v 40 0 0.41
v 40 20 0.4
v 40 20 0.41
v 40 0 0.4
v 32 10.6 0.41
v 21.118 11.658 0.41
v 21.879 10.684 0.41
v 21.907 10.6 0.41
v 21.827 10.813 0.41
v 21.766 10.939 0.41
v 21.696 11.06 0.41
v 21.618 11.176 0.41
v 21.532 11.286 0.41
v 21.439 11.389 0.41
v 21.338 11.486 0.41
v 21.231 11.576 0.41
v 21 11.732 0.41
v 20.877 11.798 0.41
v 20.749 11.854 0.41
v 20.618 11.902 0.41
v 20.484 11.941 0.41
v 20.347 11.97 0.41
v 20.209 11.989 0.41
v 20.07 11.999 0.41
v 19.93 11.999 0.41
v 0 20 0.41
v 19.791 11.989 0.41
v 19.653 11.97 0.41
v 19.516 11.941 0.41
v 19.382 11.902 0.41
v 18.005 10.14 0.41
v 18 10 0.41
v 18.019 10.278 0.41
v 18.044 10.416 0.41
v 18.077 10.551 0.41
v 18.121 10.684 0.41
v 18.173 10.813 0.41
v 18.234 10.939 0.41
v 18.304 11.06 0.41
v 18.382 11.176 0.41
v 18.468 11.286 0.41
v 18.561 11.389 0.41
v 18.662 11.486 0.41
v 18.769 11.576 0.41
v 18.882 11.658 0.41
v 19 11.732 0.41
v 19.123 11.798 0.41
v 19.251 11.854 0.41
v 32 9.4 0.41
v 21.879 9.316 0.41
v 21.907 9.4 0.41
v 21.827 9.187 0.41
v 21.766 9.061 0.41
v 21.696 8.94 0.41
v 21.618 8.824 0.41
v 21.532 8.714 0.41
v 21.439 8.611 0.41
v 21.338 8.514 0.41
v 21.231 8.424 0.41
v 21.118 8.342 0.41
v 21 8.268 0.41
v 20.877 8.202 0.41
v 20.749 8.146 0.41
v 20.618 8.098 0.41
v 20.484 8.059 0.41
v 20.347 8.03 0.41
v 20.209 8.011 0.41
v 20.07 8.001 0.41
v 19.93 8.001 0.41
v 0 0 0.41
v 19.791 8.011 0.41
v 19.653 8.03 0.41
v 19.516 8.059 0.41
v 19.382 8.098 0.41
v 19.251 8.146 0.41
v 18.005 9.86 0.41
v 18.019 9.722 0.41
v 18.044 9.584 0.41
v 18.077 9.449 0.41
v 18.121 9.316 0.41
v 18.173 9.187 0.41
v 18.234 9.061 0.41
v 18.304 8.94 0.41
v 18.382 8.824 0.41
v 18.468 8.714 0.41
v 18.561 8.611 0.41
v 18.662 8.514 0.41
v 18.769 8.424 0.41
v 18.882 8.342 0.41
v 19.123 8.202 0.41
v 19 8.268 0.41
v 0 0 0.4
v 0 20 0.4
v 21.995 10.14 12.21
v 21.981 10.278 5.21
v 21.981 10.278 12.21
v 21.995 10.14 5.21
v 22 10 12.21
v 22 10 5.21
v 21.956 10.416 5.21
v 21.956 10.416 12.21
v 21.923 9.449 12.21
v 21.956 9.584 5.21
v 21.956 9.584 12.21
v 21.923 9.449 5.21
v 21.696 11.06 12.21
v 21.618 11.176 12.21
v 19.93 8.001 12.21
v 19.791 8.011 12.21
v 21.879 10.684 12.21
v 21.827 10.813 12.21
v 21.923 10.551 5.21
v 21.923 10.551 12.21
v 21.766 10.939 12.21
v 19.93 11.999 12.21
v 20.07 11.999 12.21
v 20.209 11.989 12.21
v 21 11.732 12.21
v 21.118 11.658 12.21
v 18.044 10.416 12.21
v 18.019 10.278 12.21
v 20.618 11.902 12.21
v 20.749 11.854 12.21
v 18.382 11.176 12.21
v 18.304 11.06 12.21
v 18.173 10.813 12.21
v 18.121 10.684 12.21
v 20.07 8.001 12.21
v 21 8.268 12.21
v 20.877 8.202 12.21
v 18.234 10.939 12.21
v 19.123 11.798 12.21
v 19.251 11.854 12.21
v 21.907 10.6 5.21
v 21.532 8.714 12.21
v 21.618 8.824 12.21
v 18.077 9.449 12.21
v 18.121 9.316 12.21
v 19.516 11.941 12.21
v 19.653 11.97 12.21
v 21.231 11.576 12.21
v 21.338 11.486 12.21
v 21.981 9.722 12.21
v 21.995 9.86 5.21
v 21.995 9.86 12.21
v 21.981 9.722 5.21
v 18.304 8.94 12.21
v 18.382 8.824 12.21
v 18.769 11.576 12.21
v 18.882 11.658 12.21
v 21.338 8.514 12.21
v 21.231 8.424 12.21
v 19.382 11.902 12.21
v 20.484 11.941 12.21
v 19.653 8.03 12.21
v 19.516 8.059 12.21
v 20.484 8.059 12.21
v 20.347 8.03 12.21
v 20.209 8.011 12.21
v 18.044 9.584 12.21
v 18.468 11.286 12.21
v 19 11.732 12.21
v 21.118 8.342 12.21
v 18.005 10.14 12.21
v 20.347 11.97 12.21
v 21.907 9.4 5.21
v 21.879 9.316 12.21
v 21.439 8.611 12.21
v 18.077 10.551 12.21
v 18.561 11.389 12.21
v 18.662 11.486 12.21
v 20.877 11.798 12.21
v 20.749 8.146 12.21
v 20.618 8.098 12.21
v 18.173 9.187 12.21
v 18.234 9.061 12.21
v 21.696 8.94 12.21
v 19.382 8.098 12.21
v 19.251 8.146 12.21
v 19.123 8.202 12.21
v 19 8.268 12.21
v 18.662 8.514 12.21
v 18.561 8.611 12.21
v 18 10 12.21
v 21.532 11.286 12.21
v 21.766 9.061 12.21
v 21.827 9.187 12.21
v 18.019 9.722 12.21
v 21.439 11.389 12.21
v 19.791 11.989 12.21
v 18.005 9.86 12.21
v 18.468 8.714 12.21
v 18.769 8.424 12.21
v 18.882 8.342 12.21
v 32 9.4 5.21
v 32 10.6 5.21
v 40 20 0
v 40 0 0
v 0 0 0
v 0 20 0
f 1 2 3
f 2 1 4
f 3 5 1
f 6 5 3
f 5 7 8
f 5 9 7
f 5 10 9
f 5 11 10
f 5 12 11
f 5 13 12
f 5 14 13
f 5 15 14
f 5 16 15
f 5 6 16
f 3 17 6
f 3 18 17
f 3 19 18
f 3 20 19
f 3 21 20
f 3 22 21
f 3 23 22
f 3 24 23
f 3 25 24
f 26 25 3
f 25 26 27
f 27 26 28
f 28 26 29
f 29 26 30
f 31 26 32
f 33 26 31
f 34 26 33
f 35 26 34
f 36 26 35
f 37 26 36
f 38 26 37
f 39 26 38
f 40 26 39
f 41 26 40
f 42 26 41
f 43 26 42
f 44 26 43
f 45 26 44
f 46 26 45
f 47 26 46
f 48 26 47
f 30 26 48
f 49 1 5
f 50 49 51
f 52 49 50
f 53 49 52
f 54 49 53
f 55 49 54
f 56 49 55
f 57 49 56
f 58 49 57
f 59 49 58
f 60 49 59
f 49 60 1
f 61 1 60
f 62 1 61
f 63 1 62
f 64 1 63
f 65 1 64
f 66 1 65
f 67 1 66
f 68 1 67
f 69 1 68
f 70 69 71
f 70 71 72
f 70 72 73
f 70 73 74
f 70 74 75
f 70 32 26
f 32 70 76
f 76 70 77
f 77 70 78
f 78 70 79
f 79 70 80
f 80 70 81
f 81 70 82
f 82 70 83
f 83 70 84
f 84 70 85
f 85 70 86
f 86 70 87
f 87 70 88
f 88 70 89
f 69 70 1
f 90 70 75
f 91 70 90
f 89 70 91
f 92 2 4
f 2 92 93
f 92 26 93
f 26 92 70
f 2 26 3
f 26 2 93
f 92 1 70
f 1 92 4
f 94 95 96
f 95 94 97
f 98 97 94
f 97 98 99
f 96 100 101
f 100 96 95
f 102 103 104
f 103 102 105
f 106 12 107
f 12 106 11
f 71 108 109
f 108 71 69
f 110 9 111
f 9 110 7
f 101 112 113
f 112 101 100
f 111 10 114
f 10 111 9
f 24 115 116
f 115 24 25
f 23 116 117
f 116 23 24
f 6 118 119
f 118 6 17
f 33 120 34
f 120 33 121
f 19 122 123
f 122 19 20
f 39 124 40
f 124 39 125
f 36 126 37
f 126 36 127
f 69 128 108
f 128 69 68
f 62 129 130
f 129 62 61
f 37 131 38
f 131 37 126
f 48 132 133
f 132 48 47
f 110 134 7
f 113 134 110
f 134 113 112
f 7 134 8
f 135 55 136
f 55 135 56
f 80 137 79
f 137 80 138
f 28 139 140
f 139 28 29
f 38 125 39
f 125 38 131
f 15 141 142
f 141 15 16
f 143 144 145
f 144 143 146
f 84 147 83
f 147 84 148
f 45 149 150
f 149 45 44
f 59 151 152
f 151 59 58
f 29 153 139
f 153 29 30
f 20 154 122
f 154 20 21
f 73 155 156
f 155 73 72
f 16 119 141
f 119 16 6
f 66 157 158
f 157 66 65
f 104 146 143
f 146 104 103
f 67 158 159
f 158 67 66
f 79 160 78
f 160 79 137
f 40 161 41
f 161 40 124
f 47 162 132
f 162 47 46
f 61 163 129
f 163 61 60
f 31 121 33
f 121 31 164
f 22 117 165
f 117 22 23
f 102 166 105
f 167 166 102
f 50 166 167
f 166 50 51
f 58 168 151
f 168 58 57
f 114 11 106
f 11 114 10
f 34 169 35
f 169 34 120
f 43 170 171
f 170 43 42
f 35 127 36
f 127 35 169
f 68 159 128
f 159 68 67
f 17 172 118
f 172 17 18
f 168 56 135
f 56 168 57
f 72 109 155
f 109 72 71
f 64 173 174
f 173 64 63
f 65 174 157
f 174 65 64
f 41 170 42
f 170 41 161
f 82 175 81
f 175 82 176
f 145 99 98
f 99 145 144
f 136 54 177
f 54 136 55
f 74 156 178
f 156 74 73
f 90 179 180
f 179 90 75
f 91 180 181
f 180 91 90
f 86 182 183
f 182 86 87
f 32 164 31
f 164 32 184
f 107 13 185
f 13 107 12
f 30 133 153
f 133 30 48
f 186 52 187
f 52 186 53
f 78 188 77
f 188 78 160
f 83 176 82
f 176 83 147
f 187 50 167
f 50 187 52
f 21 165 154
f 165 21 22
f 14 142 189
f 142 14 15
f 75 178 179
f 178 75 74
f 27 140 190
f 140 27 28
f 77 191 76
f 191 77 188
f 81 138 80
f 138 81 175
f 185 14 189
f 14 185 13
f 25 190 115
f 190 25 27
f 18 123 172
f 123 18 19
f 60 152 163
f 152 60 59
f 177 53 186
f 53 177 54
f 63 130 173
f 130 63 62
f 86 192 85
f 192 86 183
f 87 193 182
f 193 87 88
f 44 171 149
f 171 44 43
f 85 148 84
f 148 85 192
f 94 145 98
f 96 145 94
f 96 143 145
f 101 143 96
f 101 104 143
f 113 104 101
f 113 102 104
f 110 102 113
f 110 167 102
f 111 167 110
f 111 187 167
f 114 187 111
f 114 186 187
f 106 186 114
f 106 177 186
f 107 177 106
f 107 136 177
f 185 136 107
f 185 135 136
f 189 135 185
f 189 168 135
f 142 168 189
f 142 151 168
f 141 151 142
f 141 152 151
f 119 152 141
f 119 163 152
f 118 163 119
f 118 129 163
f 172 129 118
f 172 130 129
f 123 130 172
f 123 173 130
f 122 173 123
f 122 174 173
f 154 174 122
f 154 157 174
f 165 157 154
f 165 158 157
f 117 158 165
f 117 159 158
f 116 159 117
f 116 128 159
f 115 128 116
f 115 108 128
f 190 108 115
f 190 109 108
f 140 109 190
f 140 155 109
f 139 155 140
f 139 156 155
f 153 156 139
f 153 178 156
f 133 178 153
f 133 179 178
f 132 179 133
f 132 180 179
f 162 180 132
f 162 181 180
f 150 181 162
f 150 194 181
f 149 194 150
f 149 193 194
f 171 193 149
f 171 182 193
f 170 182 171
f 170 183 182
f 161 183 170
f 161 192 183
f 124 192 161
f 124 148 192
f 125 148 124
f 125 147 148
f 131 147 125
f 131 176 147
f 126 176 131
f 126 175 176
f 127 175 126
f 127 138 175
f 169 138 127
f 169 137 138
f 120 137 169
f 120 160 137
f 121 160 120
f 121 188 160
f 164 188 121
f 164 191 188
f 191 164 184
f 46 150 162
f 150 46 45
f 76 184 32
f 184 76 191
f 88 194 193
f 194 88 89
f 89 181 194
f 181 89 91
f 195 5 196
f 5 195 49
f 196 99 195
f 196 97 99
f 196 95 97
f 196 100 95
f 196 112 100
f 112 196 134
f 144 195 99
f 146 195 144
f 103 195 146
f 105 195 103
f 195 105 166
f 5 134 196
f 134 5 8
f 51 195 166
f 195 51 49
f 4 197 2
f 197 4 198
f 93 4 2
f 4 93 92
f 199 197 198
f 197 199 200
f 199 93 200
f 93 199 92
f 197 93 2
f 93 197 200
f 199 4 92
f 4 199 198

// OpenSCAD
// file: ../../Base/PlacementOptions.scad
// Fischertechnik Box Foundation
// Placement Options

// Alignment
NoAlign = 0;
AlignLeft = 1;
AlignBottom = 2;
AlignCenter = 3;
AlignRight = 4;
AlignTop = 5;

// Element rotation degree steps
rotations = [0, -90, -180, -270];

// Rotation
NoRotation = 0;
Rotate0 = 0;
Rotate90 = 1;
Rotate180 = 2;
Rotate270 = 3;

// Docking (seen from above)
NoDock = -1;
DockLeft = 0;
DockTop = 1;
DockRight = 2;
DockCorner = 2;
DockBottom = 3;

// Web corners
LowerLeft = 0;
UpperLeft = 1;
UpperRight = 2;
LowerRight = 3;

// Web position relative to corner
LeftOfCorner = 0;
RightOfCorner = 1;
// file: ../../Base/Boxes.scad
// Fischertechnik Box Foundation
// Pre-designed Boxes

use <Constants.scad>

include <PlacementOptions.scad>

box190Width = 190;
box190Depth = 130;
box130Width = 130;
box130Depth = 95;
boxUsageHeight = 33.9;
boxWallThickness = 2.4;
boxBaseThickness = 1.0;
boxWebWidth = 3.0;

// getBoxWallThickness()
// Gets the wall thickness of a Fischertechnik Box

function getBoxWallThickness() = boxWallThickness;

// Gets the usable height of a fischertechnik box
function getBoxUsageHeight() = boxUsageHeight;

// Gets the thickness of the Fischertechnik box base.
function getBoxBaseThickness() = boxBaseThickness;

// Gets the width of a box web
function getBoxWebWidth() = boxWebWidth;

// Gets the usable inner space of a Box 190 as an x/y-list
function getBox190Space() = [
    box190Width - 2*getBoxWallThickness(), 
    box190Depth - 2*getBoxWallThickness() ];

// Imports the Fischertechnik empty box 130x190 mm and places it at position 0,0
// 190x130 are the outer sizes, the inner space is slightly smaller. Use getBox190Space() to get the inner sizes.
// This module needs the STL file "Fischertechnik Box 130x190.stl" in the library path.
// The box is positioned that the usable inner space is at the 0,0,0 position. The

module Box190() {
    translate([-getBoxWallThickness(),-getBoxWallThickness(),-getBoxBaseThickness()])
        import("Fischertechnik Box 130x190.stl", convexity=3);
}

// Gets the usable inner space of a Box 130 as an x/y-list
function getBox130Space() = [
    box130Width - 2*getBoxWallThickness(), 
    box130Depth - 2*getBoxWallThickness() ];

// Imports the Fischertechnik empty box 95x130 mm and places it at position 0,0
// 190x130 are the outer sizes, the inner space is slightly smaller. Use getBox190Space() to get the inner sizes.
// This module needs the STL file "Fischertechnik Box 95x130.stl" in the library path.
// The box is positioned that the usable inner space is at the 0,0,0 position. The

module Box130() {
    translate([-getBoxWallThickness(),-getBoxWallThickness(),-getBoxBaseThickness()])
        import("Fischertechnik Box 95x130.stl", convexity=3);
}

// Creates a web at the specified box walls
// corner 0 = LowerLeft, 1 = UpperLeft, 2 = UpperRight, 3 = LowerRight
// side 0 = LeftOfCorner, 1 = RightOfCorner
// distance = Distance in mm from the corner
// box = inner width and depth of the box (default: Box 190)
// webWidth = length of the web (default is 3 mms)
// webThickness = thickness of the web (default is 1 mm)

module BoxWeb(corner, side, distance, box=getBox190Space(), webWidth=getBoxWebWidth(), webThickness=1.0) {
    sink = getBoxWallThickness()/2;

    width = (corner % 2 == 0) ? 
            (side == LeftOfCorner ? webWidth : webThickness) :
            (side == LeftOfCorner ? webThickness : webWidth);

    depth = (corner % 2 == 0) ? 
            (side == RightOfCorner ? webWidth : webThickness) :
            (side == RightOfCorner ? webThickness : webWidth);
    
    xDiff = corner == LowerLeft ? 
                (side == LeftOfCorner ? -sink : distance) :
            (corner == UpperLeft ?                
                (side == LeftOfCorner ? distance : -sink) :
            (corner == UpperRight ?
                (side == LeftOfCorner ? box.x-webWidth+sink : box.x-distance-webThickness) :
                (side == LeftOfCorner ? box.x-distance-webThickness: box.x-webWidth+sink)));

    yDiff = corner == LowerLeft ? 
                (side == RightOfCorner ? -sink : distance) :
            (corner == UpperLeft ?
                (side == RightOfCorner ? box.y-distance : box.y-webWidth+sink) :
            (corner == UpperRight ?
                (side == RightOfCorner ? box.y-webWidth+sink : box.y-distance) :
                (side == RightOfCorner ? distance : -sink)));
    
    translate([xDiff, yDiff, -getExcess()])
        cube([width, depth, boxUsageHeight + 2*getExcess()]);
}
// file: ../../Base/Rotation.scad
// Fischertechnik Box Foundation
// Geometry Helpers Rotation

include <PlacementOptions.scad>

// getRotatedSpace(space, rotation=NoRotation)
// Rotates the space dependent on the specified rotation

function getRotatedSpace(space, rotation=NoRotation) = [
    (rotation == Rotate90 || rotation == Rotate270) ? space.y : space.x,
    (rotation == Rotate90 || rotation == Rotate270) ? space.x : space.y
];

// Rotates the given space around the fixed left lower corner
// space = the space the children needs as width/depth list [width,depth]
// rotation = 0 Rotate0 degrees, 1 Rotate90 degrees, 2 Rotate180 degrees, 3 Rotate270 degrees (equivalent to -90)

module RotateFix(space, rotation=Rotate0) {
    dy = (rotation == Rotate0 || rotation == Rotate270) ? 0 :
        (rotation == Rotate90) ? space.x :
        space.y;
    dx = (rotation < Rotate180) ? 0 :
        (rotation == Rotate180) ? space.x :
        space.y;
    
    translate([dx, dy, 0])
        rotate([0, 0, rotations[rotation]])
            children();
}
// file: ../../Base/Alignment.scad
// Fischertechnik Box Foundation
// Geometry Helpers Alignment

include <PlacementOptions.scad>

// getAlignedX(elementWidth, spaceWidth, align=AlignRight, offset=0)
// Gets the aligned X offset of an element with the given
// width in the given space.
// elementWidth = The width of the element to positon
// spaceWidth = The space where the element should be aligned
// align = 0 AlignLeft, 1 AlignCenter, 2 AlignRight
// offset = an optional offset from the aligned position. When
// aligned left or centered, then positive values are in X direction.
// When aligned right then positive values are in negative X direction.

function getAlignedX(elementWidth, spaceWidth, align=AlignRight, offset=0) =
    (align == AlignLeft) ?
        offset :
        ((align == AlignCenter) ?
        (spaceWidth - elementWidth)/2 + offset :
        spaceWidth - offset - elementWidth);

// getAlignedY(elementDepth, spaceDepth, align=AlignTop, offset=0)
// Gets the aligned Y offset of an element with the given
// depth in the given space.
// elementDepth = The depth of the element to positon
// spaceDepth = The space where the element should be aligned
// align = 0 AlignBottom, 1 AlignCenter, 2 AlignTop
// offset = an optional offset from the aligned position. When
// aligned bottom or centered, then positive values are in Y direction.
// When aligned top then positive values are in negative Y direction.

function getAlignedY(elementDepth, spaceDepth, align=AlignTop, offset=0) =
    (align == AlignBottom) ?
        offset :
        ((align == AlignCenter) ?
        (spaceDepth - elementDepth)/2 + offset :
        spaceDepth - offset - elementDepth);
// file: ../../Base/Placement.scad
// Fischertechnik Box Foundation
// Geometry Helpers Placement

use <Constants.scad>
use <Alignment.scad>
use <Rotation.scad>
use <Boxes.scad>

include <PlacementOptions.scad>

// Place(x=0, y=0, elementSpace=[0,0], alignX=AlignLeft, alignY=AlignBottom, rotation=Rotate0, boxSpace=getBox190Space())
// Places the child at the specified position
// y = Y-Position. This is a relative position when an X aligment is specified.
// x = X-Position. This is a relative position when an Y aligment is specified.
// elementSpace = space of the element to be placed [x,y]
// alignX = -1=NoAlign, 0 AlignLeft, 1 AlignCenter, 3 AlignRight (elementSpace and boxSpace required!)
// alignY = -1=NoAlign, 2 AlignBottom, 1 AlignCenter, 4 AlignTop (elementSpace and boxSpace required!)
// rotation = 0 Rotate0 0 degrees, 1 Rotate90 90 degrees, 
// 2 Rotate180 180 degrees, 3 Rotate270 270 degrees (equivalent to -90)
// boxSpace = Inner space of the box where the placement occurs [x,y] - default is Box 190x130 inner space

module Place(x=0, y=0, elementSpace=[0,0], 
  alignX=AlignLeft, alignY=AlignBottom, 
  rotation=NoRotation, boxSpace=getBox190Space()) {

    module Position(x, y, space, rotation=Rotate0) {
        translate([x, y, 0])
            RotateFix(space, rotation)
                children();
    }

    space = getRotatedSpace(elementSpace, rotation);
    alignedX = getAlignedX(space.x, boxSpace.x, alignX, x);
    alignedY = getAlignedY(space.y, boxSpace.y, alignY, y);
    Position(alignedX, alignedY, elementSpace, rotation)
        children();
}

// Center(space=getBox130Space(), elementSpace=[0,0])
// space = Space where the children is centered. For cylinder use centered=true and no elementSpace.
// elementSpace = space of the element to be centered [x,y]

module Center(space=getBox190Space(), elementSpace=[0,0]) {
    translate([(space.x - elementSpace.x) / 2, (space.y - elementSpace.y) / 2])
        children(0);
}

// CenterHorizontal(width=0, y=0, offset=0, space=getBox130Space())
// space = Space where the children is centered. For cylinder use centered=true and no elementSpace.
// elementSpace = space of the element to be centered [x,y]

module CenterHorizontal(width=0, y=0, offset=0, space=getBox190Space()) {
    translate([(space.x - width) / 2 + offset, y])
        children(0);
}

// CenterVertical(depth=0, x=0, offset=0, space=getBox130Space())
// space = Space where the children is centered. For cylinder use centered=true and no elementSpace.
// elementSpace = space of the element to be centered [x,y]

module CenterVertical(depth=0, x=0, offset=0, space=getBox190Space()) {
    translate([x, (space.y - depth) / 2 + offset])
        children(0);
}
// file: ../../Elements/AxisClip10.scad
// Fischertechnik Box Library
// Axis for clip 10
// 31023

use <../ModelBase/Simple.scad>

width = 12;
depth = 12;
height = 23;

// getAxisClip10Space()
// Gets the space of a frame for a clip 10 with spring ring (mot2)

function getAxisClip10Space() = [width, depth, height];

// AxisClip10()
// Axis for clip 10 with spring ring (mot2)

module AxisClip10() {
    LeveledAxisWithSpace(height, height-10, getAxisClip10Space());
}

// Tests
color("lightgray")
AxisClip10();
// file: ../../Base/Constants.scad
// Fischertechnik Box Foundation
// Constants

// Constant values necessary for multiple elements

// Base constants
dividerThickness = 1.2;
excess = 0.01;
fragments = 90;
tolerance = 0.8;

// Gets the thickness of a divider 
function getDividerThickness() = dividerThickness;

// Gets the excess that is used to merge walls into each other
function getExcess() = excess;

// Gets amount of fragments of a cylinder
function getFragments() = fragments;

// Gets the inner tolerance of a frame to each side
function getTolerance() = tolerance;


// Fischertechnik specific constants
axisDiameter = 4;
axisBottomDiameter = axisDiameter + 1;
standardEdgeDistance = 2.5;
standardWebDistance = 11.5;
standardCornerLength = 15;
tubeWallFactor = 0.8;

// Gets axis diameter
function getAxisDiameter() = axisDiameter;

// Gets axis bottom diameter for thicker part at the bottom
function getAxisBottomDiameter() = axisBottomDiameter;

// gets the standard distance to the wall of the box for dockable frames with webs
function getStandardEdgeDistance() = standardEdgeDistance;

// gets the standard distance of each web to the corner of the dockable frame
function getStandardWebDistance() = standardWebDistance;

// gets the standard length of the corner walls of a dockable frame
function getStandardCornerLength() = standardCornerLength;

// gets the wall thickness of a tube.
function getTubeWallThickness() = tubeWallFactor * getDividerThickness();
// file: ../../Elements/AxisHandCrank.scad
// Fischertechnik Box Library
// Axis for Hand Crank
// 31026

use <../Base/Constants.scad>
use <../Base/Placement.scad>
use <../ModelBase/Simple.scad>

width = 40;
depth = 20;

// getAxisHandCrankSpace()
// Gets the space the hand crank needs as width (.x and .y as a list)

function getAxisHandCrankSpace() = [width, depth];

// AxisHandCrank()
// Axis to stick a hand crank on it. This needs
// a 20x40 mm rectangle in the box. To support the placement
// the axis has a thin and sinked 20x40 mm base plate.

module AxisHandCrank() {
    axisHeight = 11.8;
    AxisWithSpace(axisHeight, getAxisHandCrankSpace());
    
    webLength = 10 + getAxisDiameter() / 2;
    webDepth = getDividerThickness();
    webHeight = 4.8;
    Center(getAxisHandCrankSpace(), [0, webDepth])
        Wall([webLength, webDepth, webHeight]);
}

// Test
color("lightgray") {
AxisHandCrank();
}
// file: ../TestPrint.scad
// 3D Print Test Base

use <../Base/Constants.scad>

use <../Elements/AxisClip10.scad>

module TestPrint(elementSpace) {
    cube([elementSpace.x, elementSpace.y, 0.4]);
    translate([0,0,0.4+getExcess()]) {
        children();
    }
}

TestPrint(getAxisClip10Space())
    AxisClip10();
// main file
// 3D Print Test
// AxisHandCrank

use <../TestPrint.scad>
use <../../Elements/AxisHandCrank.scad>

TestPrint(getAxisHandCrankSpace())
    AxisHandCrank();
